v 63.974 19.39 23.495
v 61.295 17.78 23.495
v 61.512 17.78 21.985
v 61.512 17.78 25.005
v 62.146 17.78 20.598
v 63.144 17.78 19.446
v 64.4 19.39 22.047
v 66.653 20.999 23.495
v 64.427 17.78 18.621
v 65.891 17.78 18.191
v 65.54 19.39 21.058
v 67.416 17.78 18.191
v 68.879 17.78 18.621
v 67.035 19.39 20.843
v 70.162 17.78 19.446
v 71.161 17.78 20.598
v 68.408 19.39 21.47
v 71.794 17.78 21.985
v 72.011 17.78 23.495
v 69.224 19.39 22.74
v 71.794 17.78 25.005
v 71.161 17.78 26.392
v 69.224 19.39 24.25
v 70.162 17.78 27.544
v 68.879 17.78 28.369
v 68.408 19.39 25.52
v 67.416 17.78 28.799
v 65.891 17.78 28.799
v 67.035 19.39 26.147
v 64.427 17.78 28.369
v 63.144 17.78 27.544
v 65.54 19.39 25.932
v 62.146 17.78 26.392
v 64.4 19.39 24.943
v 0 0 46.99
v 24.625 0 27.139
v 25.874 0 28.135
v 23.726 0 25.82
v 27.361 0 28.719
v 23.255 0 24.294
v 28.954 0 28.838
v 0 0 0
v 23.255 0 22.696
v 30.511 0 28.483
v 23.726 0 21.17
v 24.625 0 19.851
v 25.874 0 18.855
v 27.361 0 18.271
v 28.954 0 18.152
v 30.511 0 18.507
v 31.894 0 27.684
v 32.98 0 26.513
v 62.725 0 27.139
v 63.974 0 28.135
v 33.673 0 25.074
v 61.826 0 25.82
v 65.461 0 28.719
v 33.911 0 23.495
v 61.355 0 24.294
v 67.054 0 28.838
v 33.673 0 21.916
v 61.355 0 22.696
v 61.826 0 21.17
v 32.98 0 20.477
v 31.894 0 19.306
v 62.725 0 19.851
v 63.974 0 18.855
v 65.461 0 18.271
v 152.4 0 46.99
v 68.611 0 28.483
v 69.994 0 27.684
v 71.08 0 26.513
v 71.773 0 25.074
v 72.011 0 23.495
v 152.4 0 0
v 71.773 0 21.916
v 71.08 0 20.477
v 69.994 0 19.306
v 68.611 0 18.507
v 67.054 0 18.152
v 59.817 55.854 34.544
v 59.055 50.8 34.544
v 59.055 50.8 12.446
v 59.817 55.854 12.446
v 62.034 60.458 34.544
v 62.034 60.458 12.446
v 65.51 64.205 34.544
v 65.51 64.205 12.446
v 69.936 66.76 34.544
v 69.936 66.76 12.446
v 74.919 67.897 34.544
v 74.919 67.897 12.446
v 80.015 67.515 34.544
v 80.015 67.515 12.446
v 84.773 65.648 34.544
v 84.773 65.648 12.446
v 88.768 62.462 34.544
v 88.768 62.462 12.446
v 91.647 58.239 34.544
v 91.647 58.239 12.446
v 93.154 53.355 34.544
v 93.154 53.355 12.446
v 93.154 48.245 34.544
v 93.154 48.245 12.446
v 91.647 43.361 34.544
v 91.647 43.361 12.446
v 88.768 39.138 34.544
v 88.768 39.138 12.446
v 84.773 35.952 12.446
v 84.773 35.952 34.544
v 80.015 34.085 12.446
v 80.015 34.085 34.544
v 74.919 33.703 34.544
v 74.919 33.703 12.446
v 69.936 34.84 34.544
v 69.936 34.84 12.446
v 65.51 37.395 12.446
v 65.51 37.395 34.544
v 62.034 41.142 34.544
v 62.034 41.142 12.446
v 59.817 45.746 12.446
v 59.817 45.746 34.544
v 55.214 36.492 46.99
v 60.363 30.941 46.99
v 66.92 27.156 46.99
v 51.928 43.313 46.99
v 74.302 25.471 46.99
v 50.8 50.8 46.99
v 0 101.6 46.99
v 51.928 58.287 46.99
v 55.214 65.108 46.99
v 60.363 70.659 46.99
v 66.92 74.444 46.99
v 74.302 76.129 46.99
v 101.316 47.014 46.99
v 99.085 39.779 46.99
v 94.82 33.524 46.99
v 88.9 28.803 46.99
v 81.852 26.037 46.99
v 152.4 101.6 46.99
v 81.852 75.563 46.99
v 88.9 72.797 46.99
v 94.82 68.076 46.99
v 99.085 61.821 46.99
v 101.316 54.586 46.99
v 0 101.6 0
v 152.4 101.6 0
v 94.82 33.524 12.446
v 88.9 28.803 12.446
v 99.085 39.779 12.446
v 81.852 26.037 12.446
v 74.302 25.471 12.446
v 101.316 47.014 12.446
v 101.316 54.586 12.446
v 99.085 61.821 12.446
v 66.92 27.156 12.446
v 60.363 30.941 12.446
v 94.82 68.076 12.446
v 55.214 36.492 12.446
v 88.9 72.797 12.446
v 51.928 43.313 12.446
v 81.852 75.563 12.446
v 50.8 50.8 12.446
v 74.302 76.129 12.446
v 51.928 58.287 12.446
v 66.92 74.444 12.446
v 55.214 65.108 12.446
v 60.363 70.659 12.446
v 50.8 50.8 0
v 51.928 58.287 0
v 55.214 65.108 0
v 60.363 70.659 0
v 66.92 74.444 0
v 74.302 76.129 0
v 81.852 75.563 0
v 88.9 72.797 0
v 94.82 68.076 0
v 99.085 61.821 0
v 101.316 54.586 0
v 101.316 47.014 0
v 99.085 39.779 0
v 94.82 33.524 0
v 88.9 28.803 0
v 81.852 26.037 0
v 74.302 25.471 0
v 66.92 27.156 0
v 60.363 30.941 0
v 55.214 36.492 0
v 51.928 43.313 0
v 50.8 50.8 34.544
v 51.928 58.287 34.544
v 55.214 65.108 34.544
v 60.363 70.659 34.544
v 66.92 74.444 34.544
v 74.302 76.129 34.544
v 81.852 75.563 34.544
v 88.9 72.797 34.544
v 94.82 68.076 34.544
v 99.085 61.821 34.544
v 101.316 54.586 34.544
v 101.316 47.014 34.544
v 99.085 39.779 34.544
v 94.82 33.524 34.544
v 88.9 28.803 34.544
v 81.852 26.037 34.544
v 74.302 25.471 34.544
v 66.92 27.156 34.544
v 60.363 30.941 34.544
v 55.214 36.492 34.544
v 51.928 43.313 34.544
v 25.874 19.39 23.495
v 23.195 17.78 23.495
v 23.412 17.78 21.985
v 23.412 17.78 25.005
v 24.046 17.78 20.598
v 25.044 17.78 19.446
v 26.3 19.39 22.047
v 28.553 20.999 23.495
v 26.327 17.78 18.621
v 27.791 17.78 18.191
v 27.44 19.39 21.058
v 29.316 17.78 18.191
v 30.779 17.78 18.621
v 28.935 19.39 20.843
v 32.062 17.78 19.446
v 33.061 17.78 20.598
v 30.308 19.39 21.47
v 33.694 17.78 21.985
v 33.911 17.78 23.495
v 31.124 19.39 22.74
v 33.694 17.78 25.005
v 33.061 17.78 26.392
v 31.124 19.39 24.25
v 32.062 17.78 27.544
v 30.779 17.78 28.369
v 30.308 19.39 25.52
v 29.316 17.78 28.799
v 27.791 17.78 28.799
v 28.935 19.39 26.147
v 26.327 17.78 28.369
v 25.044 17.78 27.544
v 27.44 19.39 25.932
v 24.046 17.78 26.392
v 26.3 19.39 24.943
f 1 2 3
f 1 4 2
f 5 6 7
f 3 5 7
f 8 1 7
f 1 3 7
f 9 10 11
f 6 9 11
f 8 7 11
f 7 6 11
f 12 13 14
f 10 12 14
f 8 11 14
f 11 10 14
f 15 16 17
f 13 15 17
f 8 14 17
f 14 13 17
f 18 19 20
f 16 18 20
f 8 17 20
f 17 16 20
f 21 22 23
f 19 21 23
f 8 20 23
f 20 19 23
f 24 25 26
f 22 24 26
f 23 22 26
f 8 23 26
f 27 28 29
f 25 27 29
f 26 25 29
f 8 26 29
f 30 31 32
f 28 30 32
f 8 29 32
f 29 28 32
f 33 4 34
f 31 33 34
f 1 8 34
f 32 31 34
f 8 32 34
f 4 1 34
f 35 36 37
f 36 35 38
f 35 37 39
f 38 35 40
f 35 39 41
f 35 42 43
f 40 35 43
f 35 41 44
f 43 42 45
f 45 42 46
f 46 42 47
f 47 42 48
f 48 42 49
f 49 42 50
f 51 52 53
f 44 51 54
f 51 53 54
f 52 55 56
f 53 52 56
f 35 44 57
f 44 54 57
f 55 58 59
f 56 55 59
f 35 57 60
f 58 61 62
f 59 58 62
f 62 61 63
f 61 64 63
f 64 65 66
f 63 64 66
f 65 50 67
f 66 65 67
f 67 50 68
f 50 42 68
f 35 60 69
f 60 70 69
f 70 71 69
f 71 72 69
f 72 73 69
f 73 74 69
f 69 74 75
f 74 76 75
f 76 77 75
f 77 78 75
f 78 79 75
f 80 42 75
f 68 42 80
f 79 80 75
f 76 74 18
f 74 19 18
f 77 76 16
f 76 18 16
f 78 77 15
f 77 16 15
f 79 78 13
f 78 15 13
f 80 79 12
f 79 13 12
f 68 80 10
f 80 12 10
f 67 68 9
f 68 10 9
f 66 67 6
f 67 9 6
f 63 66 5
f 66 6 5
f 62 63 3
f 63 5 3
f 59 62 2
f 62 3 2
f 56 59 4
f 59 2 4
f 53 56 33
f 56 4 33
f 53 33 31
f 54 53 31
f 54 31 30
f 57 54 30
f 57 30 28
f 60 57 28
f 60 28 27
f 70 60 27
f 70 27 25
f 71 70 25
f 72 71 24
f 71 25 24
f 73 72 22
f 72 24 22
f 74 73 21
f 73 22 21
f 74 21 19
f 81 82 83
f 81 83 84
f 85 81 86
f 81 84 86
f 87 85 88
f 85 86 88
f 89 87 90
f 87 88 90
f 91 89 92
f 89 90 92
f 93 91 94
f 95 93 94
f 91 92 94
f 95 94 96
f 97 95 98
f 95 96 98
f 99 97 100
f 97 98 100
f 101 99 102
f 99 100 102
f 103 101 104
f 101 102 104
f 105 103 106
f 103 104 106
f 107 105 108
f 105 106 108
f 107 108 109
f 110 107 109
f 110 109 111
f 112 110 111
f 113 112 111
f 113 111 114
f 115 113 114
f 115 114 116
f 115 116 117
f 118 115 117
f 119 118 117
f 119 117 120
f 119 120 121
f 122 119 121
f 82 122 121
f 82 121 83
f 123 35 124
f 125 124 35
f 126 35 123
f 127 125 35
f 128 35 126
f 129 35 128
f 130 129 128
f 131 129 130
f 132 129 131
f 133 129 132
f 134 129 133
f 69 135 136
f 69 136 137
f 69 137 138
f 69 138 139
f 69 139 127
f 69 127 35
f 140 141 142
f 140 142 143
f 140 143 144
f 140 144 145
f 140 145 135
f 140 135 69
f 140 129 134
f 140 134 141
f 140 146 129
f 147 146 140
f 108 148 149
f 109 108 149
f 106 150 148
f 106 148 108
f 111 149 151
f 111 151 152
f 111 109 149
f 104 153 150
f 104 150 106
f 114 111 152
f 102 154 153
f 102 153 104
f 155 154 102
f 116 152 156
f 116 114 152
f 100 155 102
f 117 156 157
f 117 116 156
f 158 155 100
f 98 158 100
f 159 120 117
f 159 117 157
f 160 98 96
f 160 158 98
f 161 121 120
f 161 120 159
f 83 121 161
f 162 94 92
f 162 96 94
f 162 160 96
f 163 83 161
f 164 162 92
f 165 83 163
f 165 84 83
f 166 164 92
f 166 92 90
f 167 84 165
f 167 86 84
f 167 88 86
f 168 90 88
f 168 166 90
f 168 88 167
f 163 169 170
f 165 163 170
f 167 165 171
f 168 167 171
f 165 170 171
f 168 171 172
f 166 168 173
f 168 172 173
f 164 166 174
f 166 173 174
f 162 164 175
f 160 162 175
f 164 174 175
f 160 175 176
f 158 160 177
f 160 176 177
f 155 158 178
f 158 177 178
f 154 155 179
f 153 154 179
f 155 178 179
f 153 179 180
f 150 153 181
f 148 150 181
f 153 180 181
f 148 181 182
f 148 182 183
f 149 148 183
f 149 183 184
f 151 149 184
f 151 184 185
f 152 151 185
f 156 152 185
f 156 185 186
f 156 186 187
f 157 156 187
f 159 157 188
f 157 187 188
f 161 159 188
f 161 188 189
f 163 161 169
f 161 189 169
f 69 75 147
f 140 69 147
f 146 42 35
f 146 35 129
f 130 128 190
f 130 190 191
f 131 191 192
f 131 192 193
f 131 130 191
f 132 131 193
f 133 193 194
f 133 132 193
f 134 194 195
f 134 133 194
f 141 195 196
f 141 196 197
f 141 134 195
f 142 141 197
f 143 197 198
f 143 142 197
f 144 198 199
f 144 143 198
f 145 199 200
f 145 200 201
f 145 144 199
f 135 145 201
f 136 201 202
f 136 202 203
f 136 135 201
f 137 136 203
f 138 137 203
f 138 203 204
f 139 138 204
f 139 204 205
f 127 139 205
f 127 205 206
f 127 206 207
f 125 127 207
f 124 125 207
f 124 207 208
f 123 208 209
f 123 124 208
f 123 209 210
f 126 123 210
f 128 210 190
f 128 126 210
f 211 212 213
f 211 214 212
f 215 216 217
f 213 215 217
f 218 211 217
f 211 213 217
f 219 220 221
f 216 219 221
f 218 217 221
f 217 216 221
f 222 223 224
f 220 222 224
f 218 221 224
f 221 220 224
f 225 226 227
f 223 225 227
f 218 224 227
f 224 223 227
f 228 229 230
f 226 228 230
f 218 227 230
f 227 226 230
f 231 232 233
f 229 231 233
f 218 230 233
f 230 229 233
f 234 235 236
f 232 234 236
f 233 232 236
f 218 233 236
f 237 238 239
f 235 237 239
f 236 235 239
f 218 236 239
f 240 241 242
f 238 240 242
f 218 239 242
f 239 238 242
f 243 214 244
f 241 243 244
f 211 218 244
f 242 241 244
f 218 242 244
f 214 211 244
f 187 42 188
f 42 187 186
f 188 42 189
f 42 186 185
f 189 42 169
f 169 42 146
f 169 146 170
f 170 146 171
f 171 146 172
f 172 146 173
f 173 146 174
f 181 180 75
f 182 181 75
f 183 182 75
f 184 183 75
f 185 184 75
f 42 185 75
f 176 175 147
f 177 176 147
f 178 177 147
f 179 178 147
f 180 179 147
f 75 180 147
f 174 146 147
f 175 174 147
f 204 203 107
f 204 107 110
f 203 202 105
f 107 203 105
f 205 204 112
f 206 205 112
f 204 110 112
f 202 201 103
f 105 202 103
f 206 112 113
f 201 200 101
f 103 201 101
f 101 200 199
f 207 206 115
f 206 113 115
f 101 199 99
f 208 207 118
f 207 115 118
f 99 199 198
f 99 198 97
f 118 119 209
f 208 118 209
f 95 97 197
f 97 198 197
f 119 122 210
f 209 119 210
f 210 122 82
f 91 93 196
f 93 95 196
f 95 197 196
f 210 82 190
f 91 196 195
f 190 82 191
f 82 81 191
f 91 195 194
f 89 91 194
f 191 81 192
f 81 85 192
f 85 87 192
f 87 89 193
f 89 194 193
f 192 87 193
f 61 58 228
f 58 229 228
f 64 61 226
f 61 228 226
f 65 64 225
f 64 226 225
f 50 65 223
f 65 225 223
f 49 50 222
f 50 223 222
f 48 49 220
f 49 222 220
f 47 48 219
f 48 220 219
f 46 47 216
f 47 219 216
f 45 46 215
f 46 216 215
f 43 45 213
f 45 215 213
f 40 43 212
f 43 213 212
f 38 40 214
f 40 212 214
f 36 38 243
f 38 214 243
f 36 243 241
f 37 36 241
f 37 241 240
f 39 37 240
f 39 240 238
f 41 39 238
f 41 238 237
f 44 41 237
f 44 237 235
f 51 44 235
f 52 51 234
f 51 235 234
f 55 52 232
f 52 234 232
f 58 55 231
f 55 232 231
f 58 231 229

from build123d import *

# Parameters (mm, degrees)
SKETCH1_W                       = 152.4
SKETCH1_H                       = 101.6
BOSS_EXTRUDE1_DEPTH             = 46.99
SKETCH2_R                       = 17.145
CUT_EXTRUDE1_DEPTH              = 190.093574983
SKETCH2_2_R                     = 25.4
SKETCH2_2_R_2                   = 17.145
CUT_EXTRUDE3_DEPTH              = 12.446
TAP_DRILL_FOR_1_2_13_TAP1_D     = 10.71626
TAP_DRILL_FOR_1_2_13_TAP1_DEPTH = 17.78
TAP_DRILL_FOR_1_2_13_TAP1_TIP   = 3.219489309


with BuildPart() as part:
    # Sketch1 → Boss-Extrude1 (new body)
    with BuildSketch(Plane.XY):
        with Locations((76.2, 50.8)):
            Rectangle(SKETCH1_W, SKETCH1_H)
    extrude(amount=BOSS_EXTRUDE1_DEPTH)

    # Sketch2 → Cut-Extrude1 (cut, through all)
    with BuildSketch(Plane(origin=(0, 0, 0), x_dir=(-1, 0, 0), z_dir=(0, 0, -1))):
        with Locations((-76.2, 50.8)):
            Circle(SKETCH2_R)
    extrude(amount=-CUT_EXTRUDE1_DEPTH, mode=Mode.SUBTRACT)

    # Sketch2<2> → Cut-Extrude3 (cut)
    with BuildSketch(Plane(origin=(0, 0, 0), x_dir=(-1, 0, 0), z_dir=(0, 0, -1))):
        with Locations((-76.2, 50.8)):
            Circle(SKETCH2_2_R)
        with Locations((-76.2, 50.8)):
            Circle(SKETCH2_2_R_2, mode=Mode.SUBTRACT)
    cut_extrude3 = extrude(amount=-CUT_EXTRUDE3_DEPTH, mode=Mode.SUBTRACT)

    # Mirror2: Cut-Extrude3 across plane
    add(cut_extrude3.mirror(Plane(origin=(0, 0, 23.495), x_dir=(1, 0, 0), z_dir=(0, 0, -1))), mode=Mode.SUBTRACT)

    # Tap Drill for 1/2-13 Tap1
    with Locations(Plane(origin=(0, 0, 0), x_dir=(-1, 0, 0), z_dir=(0, -1, 0))):
        with Locations((-66.653283, -23.495), (-28.553283, -23.495)):
            Hole(TAP_DRILL_FOR_1_2_13_TAP1_D / 2, depth=TAP_DRILL_FOR_1_2_13_TAP1_DEPTH)
            with Locations((0, 0, -(TAP_DRILL_FOR_1_2_13_TAP1_DEPTH + TAP_DRILL_FOR_1_2_13_TAP1_TIP / 2))):  # 118° drill point
                Cone(0, TAP_DRILL_FOR_1_2_13_TAP1_D / 2, TAP_DRILL_FOR_1_2_13_TAP1_TIP, mode=Mode.SUBTRACT)


solid = part.part
